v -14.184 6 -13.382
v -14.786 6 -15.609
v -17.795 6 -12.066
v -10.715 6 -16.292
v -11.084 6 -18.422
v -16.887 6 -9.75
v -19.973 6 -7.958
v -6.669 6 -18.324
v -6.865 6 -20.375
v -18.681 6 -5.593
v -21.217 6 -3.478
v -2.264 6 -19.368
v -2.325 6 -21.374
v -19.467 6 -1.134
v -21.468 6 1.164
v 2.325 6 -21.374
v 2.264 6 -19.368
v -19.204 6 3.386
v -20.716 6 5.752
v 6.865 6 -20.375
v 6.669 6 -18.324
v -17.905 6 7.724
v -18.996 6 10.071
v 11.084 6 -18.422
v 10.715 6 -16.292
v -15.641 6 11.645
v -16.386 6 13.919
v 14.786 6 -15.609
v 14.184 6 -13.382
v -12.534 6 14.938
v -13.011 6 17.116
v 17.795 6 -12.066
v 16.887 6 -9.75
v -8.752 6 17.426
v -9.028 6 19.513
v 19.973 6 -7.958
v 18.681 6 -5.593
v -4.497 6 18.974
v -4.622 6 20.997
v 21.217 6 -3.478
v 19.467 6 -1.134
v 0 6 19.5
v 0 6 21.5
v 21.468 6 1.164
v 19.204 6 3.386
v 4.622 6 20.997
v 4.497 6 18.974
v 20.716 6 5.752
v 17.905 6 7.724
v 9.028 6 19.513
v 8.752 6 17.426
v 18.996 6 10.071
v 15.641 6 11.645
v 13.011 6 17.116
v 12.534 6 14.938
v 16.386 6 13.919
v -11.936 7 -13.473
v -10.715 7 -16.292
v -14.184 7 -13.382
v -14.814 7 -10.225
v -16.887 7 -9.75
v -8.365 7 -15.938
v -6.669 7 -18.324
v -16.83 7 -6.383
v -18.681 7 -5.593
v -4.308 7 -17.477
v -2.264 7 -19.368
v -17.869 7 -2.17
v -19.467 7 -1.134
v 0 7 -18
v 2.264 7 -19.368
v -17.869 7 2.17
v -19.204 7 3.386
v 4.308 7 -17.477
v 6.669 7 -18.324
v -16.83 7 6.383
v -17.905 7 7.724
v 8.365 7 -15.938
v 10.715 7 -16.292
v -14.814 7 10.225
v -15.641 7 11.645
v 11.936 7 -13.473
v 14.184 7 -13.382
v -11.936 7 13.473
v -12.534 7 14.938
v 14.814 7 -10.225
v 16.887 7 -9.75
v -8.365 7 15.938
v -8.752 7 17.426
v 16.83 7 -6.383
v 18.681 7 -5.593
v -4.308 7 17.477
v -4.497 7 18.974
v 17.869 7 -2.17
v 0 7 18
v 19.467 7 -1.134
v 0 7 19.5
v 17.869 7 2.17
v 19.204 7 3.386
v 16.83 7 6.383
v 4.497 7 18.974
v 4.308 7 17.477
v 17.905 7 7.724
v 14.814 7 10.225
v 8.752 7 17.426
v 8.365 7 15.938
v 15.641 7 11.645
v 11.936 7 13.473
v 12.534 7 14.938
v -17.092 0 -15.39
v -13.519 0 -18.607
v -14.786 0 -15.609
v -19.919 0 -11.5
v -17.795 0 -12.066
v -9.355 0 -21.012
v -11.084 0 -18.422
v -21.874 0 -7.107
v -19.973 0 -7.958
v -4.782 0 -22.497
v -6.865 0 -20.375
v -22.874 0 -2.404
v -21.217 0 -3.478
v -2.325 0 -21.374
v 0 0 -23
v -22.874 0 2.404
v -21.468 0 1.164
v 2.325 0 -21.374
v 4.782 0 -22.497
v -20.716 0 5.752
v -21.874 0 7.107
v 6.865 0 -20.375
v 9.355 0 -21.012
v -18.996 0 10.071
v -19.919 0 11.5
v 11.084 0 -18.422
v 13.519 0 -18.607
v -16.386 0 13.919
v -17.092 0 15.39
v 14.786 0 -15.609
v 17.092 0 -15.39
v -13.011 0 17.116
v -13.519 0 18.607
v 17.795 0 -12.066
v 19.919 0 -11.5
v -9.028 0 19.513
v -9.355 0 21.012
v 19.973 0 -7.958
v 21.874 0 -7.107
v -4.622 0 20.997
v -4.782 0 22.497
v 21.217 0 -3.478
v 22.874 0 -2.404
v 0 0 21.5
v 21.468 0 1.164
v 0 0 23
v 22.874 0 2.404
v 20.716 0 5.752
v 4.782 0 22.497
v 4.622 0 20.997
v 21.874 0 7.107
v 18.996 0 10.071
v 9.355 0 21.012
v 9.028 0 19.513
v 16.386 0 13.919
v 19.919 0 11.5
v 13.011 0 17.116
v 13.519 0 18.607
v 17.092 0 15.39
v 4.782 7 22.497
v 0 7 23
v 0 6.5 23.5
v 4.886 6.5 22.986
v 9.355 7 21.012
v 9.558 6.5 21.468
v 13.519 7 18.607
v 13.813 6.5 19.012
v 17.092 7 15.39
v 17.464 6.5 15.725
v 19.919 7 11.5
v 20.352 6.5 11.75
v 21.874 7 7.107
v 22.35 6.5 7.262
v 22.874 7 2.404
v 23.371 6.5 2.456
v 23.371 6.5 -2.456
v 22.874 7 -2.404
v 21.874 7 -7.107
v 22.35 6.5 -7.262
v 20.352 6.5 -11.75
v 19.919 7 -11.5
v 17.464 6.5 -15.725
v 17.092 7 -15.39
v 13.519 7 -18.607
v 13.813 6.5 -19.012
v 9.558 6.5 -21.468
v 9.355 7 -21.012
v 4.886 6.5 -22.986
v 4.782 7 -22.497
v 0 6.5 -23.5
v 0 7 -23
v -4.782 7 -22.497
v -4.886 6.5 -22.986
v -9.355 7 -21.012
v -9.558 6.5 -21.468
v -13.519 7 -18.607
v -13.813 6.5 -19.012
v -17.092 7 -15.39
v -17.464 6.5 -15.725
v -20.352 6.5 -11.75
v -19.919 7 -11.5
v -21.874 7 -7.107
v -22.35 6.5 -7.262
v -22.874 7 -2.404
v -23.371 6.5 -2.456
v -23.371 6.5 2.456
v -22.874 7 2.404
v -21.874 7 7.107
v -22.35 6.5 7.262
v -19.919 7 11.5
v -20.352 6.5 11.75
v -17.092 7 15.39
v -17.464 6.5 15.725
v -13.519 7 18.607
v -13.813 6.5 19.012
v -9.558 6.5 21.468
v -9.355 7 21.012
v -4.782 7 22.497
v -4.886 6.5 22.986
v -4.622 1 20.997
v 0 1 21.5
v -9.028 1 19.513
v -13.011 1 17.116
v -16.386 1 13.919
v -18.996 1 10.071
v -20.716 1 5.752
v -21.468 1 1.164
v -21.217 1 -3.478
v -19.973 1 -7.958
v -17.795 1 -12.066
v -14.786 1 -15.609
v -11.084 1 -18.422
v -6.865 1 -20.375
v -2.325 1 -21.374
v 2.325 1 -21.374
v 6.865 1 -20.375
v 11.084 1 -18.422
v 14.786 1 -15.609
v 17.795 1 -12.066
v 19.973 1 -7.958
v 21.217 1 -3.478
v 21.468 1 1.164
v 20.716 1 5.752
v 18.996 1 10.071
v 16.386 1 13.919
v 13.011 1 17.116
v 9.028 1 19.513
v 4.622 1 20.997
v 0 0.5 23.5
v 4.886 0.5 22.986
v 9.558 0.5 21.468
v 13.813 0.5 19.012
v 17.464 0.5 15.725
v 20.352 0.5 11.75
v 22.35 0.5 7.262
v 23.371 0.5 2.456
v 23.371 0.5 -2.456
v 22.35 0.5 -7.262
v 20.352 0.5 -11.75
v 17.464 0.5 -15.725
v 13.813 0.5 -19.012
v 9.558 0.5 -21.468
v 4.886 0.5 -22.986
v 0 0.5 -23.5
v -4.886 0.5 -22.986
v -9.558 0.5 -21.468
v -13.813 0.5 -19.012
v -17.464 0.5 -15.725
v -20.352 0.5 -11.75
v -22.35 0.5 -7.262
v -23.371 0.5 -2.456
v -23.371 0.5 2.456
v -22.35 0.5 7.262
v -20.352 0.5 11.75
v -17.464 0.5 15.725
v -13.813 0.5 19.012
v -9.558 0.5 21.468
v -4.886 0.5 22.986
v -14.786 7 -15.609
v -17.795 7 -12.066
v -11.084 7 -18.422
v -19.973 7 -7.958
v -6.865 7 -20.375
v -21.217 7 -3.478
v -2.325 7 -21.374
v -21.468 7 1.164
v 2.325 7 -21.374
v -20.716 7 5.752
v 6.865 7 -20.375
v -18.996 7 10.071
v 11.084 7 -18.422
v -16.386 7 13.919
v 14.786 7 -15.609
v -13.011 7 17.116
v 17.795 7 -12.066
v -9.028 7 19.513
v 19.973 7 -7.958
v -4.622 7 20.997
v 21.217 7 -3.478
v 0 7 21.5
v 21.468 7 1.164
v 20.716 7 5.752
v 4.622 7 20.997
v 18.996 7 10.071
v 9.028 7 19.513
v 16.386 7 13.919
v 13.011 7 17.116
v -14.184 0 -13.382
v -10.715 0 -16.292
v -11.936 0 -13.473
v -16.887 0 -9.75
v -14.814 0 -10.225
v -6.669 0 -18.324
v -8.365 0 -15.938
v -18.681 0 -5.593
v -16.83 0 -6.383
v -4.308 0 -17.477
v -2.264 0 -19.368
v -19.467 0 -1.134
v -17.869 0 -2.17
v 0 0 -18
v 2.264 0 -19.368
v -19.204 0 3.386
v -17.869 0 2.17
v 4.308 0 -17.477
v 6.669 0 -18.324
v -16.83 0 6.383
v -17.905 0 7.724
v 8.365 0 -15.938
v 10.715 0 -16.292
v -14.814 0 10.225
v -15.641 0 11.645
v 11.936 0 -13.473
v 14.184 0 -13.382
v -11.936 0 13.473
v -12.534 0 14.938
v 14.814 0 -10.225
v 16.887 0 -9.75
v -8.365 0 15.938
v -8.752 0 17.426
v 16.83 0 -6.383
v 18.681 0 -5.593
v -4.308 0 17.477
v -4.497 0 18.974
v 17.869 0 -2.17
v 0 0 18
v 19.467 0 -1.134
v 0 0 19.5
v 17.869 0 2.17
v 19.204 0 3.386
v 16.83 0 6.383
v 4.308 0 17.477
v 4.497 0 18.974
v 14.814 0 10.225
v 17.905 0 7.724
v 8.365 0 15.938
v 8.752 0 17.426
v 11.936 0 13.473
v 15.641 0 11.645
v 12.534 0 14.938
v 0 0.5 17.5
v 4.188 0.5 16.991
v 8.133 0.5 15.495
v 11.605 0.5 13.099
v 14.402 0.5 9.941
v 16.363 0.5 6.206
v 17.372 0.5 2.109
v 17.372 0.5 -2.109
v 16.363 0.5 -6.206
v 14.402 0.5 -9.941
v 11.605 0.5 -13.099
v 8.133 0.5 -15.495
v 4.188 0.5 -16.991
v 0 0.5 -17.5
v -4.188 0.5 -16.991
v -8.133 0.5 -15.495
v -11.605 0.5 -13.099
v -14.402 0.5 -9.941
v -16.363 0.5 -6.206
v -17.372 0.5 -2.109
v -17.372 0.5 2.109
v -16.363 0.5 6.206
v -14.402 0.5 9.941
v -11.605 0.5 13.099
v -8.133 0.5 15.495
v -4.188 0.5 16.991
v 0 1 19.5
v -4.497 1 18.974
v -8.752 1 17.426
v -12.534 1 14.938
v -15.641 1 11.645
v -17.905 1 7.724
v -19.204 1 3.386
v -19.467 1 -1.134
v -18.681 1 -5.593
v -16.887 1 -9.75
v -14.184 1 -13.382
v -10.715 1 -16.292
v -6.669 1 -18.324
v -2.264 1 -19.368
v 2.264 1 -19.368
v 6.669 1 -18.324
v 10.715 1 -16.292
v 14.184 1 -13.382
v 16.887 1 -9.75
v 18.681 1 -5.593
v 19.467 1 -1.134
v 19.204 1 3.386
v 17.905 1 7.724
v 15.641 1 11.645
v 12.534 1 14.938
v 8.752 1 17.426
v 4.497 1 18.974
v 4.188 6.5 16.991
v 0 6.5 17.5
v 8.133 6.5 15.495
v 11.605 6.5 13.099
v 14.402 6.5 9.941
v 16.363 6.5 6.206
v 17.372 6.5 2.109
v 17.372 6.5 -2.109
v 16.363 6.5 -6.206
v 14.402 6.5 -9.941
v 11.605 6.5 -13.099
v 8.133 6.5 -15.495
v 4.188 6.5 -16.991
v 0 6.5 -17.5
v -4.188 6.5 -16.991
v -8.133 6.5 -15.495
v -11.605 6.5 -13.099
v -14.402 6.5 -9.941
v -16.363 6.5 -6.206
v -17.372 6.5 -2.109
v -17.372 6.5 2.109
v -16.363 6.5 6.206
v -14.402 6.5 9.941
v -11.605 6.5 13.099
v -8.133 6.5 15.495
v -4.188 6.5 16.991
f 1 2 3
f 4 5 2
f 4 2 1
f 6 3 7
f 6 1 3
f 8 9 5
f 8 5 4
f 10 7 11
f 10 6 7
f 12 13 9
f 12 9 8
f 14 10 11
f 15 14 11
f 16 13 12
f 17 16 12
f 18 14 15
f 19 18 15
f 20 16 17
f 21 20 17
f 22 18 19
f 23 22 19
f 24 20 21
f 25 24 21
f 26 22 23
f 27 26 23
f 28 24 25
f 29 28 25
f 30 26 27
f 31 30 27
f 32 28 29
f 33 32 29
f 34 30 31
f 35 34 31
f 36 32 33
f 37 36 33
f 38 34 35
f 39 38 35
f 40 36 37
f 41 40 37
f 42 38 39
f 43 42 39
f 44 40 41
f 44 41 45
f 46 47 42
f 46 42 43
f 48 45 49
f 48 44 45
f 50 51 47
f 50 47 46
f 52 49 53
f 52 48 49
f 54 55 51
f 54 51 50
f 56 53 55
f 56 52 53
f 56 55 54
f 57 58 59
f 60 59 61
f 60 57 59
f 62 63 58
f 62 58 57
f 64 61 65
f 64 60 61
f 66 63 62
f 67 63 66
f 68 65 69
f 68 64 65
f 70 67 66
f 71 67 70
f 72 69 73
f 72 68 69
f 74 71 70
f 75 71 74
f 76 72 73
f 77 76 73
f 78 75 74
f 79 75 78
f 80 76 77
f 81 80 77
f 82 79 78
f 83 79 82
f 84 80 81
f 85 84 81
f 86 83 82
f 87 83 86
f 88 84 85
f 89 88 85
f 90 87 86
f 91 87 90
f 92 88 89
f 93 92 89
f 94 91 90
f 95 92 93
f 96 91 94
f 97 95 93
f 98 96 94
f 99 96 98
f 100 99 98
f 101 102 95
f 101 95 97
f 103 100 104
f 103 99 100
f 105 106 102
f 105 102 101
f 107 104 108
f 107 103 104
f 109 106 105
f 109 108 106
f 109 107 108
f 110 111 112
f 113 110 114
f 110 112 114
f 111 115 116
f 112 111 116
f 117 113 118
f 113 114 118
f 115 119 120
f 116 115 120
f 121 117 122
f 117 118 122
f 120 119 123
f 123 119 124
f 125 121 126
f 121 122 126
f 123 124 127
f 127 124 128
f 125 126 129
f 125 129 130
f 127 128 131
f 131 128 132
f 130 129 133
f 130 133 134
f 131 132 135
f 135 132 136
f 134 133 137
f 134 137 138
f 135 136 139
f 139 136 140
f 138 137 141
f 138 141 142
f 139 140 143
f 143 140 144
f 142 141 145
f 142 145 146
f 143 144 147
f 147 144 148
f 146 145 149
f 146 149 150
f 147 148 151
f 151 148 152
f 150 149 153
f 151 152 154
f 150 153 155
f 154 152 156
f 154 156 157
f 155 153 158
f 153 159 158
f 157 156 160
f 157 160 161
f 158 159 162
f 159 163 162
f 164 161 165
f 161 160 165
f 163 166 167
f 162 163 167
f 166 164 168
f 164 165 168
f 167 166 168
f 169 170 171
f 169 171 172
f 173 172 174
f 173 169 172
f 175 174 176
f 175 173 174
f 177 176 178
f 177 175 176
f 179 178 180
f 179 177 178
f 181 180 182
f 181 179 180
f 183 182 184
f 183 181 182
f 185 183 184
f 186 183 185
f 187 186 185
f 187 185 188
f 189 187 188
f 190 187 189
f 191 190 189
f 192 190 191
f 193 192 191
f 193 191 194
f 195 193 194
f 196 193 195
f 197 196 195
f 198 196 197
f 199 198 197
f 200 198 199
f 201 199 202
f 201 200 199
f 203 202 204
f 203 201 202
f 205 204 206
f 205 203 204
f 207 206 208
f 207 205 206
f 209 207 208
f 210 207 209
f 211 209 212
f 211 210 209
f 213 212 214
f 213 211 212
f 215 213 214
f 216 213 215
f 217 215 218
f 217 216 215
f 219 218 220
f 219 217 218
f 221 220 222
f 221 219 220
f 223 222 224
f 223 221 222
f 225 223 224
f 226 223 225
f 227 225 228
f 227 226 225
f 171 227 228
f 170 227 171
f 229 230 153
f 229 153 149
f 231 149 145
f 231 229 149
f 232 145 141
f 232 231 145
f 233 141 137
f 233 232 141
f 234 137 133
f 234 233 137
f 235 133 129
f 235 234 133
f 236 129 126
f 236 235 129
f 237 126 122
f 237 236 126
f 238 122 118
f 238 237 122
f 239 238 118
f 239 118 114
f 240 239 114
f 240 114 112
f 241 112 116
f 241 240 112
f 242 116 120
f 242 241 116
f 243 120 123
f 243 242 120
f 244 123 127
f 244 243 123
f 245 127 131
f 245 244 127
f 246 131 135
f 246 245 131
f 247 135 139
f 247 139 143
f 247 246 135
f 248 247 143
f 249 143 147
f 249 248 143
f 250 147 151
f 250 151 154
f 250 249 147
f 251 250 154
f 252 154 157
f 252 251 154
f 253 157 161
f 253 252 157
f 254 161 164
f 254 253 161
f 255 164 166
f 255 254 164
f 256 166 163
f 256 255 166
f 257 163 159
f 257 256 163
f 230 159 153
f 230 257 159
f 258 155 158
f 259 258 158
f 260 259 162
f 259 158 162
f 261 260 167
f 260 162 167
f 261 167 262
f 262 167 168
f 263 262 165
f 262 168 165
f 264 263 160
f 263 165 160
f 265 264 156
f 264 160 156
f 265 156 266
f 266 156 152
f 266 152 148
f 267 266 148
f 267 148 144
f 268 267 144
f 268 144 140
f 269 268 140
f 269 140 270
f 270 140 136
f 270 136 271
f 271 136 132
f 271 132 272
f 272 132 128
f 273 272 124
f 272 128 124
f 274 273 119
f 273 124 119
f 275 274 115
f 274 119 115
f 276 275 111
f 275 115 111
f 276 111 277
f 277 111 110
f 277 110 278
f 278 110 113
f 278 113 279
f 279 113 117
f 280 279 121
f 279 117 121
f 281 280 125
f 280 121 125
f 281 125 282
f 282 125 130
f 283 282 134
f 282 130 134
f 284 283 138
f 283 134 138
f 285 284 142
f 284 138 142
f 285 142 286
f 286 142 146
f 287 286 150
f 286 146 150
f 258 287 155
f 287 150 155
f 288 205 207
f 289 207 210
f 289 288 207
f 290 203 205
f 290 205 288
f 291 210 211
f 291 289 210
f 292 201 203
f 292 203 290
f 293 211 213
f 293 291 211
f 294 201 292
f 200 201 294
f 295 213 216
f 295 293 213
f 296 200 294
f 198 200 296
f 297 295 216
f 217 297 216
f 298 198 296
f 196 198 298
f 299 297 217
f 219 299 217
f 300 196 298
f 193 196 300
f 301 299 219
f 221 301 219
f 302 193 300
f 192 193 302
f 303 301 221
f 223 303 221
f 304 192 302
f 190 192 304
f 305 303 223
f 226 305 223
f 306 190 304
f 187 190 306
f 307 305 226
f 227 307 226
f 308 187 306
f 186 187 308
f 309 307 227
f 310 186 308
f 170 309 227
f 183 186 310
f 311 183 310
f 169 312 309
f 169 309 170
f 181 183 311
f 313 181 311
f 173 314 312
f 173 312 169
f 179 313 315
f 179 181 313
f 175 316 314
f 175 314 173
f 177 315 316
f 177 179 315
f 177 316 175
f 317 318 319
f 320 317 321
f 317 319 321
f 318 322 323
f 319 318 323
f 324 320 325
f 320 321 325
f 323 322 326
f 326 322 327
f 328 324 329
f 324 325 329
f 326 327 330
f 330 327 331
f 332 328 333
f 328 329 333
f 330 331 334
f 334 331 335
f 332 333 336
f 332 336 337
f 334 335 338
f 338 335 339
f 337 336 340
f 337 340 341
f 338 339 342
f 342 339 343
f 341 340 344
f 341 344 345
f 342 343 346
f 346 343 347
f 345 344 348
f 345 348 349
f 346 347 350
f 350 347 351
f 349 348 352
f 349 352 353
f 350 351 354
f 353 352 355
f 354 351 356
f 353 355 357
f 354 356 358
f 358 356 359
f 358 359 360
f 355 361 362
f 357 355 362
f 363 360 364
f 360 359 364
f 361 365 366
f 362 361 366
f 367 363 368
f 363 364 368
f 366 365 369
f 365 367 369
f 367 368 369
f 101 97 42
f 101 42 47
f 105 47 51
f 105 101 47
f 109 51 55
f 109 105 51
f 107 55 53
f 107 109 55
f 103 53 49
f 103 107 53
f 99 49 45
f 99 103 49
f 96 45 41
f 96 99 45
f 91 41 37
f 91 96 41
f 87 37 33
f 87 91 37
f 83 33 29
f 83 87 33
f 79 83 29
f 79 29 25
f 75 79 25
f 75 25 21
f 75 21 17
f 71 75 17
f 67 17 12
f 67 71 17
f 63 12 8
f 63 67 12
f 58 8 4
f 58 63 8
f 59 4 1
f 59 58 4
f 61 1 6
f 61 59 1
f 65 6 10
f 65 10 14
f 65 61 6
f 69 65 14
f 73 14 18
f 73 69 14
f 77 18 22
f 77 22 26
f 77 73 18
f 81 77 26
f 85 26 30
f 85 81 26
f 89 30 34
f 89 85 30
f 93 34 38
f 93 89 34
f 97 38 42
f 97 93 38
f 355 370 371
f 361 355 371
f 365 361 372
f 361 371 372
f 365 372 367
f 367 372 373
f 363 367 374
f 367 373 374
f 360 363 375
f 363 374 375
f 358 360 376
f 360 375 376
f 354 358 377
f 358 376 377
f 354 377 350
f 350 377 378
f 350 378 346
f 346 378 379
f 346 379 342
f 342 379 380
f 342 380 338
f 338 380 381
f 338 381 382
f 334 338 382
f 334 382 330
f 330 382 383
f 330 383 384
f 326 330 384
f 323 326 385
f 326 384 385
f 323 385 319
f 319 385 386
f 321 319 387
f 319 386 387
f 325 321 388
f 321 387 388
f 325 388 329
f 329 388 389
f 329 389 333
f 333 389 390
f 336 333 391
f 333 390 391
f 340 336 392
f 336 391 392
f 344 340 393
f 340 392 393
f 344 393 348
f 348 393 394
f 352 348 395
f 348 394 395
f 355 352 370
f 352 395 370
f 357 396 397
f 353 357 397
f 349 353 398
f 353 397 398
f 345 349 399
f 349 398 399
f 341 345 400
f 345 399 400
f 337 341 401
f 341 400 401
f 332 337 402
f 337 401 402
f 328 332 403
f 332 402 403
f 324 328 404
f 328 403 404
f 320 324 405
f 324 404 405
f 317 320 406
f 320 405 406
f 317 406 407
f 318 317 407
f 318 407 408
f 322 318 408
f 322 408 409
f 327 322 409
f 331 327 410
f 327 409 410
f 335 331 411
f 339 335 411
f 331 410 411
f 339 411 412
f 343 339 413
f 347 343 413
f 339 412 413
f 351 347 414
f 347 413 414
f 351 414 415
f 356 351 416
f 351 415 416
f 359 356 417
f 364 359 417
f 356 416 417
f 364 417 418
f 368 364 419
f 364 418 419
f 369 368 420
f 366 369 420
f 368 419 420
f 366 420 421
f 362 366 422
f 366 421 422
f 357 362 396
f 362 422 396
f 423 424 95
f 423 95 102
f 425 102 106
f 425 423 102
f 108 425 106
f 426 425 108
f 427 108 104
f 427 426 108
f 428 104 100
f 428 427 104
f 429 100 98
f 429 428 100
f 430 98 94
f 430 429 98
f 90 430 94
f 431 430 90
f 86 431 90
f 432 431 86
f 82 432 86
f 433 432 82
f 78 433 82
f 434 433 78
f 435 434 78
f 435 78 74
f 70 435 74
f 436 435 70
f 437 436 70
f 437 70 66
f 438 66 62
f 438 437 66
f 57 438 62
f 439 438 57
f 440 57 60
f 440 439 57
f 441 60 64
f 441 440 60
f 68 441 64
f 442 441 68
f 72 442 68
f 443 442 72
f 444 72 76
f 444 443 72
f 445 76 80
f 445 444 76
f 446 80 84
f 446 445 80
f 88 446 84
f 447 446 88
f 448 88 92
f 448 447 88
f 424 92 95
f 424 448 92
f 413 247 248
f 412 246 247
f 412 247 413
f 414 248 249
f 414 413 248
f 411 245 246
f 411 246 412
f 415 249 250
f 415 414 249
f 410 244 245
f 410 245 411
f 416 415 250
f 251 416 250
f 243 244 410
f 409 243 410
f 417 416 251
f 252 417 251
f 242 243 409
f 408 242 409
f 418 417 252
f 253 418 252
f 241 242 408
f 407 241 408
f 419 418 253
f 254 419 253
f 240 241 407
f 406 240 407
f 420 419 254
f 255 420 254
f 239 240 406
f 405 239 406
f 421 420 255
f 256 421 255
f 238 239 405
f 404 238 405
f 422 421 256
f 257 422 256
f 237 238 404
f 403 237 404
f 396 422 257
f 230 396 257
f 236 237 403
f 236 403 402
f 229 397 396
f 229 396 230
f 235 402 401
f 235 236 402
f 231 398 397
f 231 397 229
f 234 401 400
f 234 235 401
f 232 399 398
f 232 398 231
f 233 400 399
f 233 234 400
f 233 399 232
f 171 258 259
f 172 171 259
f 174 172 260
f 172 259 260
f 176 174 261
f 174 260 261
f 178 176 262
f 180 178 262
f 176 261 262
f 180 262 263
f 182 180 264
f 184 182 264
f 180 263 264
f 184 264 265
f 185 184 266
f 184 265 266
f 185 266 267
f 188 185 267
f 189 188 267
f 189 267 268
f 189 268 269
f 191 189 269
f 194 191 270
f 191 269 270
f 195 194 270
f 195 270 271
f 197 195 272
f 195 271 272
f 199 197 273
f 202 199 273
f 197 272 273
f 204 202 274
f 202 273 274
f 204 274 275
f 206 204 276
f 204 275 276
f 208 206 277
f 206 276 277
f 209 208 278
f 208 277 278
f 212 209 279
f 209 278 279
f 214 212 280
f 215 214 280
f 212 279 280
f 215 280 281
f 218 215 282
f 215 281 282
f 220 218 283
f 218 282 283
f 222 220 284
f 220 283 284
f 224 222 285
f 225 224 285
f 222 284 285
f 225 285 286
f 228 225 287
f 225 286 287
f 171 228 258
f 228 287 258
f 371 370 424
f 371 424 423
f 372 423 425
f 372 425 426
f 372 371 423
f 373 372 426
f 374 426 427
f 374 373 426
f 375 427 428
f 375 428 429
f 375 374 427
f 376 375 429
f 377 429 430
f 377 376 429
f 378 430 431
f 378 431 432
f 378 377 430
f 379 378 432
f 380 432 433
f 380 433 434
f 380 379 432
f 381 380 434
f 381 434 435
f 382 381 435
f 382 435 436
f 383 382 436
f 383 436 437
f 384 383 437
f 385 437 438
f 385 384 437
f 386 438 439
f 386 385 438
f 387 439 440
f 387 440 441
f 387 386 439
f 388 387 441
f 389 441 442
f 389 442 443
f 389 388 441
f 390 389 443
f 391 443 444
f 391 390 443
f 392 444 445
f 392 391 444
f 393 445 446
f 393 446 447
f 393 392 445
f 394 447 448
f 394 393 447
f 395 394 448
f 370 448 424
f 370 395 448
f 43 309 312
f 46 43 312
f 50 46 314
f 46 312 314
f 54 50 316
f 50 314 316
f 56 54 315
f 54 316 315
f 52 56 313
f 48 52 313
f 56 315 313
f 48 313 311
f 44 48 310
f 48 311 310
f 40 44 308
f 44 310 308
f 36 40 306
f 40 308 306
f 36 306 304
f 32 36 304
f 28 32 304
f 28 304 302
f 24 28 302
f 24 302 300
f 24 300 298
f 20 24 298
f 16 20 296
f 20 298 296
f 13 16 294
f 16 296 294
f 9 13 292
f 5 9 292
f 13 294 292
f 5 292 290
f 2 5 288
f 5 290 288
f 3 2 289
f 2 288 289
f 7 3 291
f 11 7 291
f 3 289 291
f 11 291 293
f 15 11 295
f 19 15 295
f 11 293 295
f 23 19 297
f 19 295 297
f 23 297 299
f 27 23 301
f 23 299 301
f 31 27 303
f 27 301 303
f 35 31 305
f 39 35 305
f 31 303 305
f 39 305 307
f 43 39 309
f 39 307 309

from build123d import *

# Parameters (mm, degrees)
SKETCH1_R           = 23.5
SKETCH1_R_2         = 17.5
BOSS_EXTRUDE1_DEPTH = 7
SKETCH2_R           = 21.5
SKETCH2_R_2         = 19.5
CUT_EXTRUDE1_DEPTH  = 1
CUT_EXTRUDE2_START  = -1
SKETCH3_R           = 21.5
SKETCH3_R_2         = 19.5
CUT_EXTRUDE2_DEPTH  = 1
CHAMFER1_SIZE       = 0.5


with BuildPart() as part:
    # Sketch1 → Boss-Extrude1 (new body)
    with BuildSketch(Plane(origin=(0, 0, 0), x_dir=(1, 0, 0), z_dir=(0, 1, 0))):
        with Locations(Location((0, 0, 0), (0, 0, 270))):
            Circle(SKETCH1_R)
        with Locations(Location((0, 0, 0), (0, 0, 270))):
            Circle(SKETCH1_R_2, mode=Mode.SUBTRACT)
    extrude(amount=BOSS_EXTRUDE1_DEPTH)

    # Sketch2 → Cut-Extrude1 (cut)
    with BuildSketch(Plane(origin=(0, 7, 0), x_dir=(1, 0, 0), z_dir=(0, 1, 0))):
        with Locations(Location((0, 0, 0), (0, 0, 270))):
            Circle(SKETCH2_R)
        with Locations(Location((0, 0, 0), (0, 0, 270))):
            Circle(SKETCH2_R_2, mode=Mode.SUBTRACT)
    extrude(amount=-CUT_EXTRUDE1_DEPTH, mode=Mode.SUBTRACT)

    # Sketch3 → Cut-Extrude2 (cut)
    with BuildSketch(Plane.XZ.offset(CUT_EXTRUDE2_START)):
        with Locations(Location((0, 0, 0), (0, 0, 90))):
            Circle(SKETCH3_R)
        with Locations(Location((0, 0, 0), (0, 0, 90))):
            Circle(SKETCH3_R_2, mode=Mode.SUBTRACT)
    extrude(amount=CUT_EXTRUDE2_DEPTH, mode=Mode.SUBTRACT)

    # Chamfer1
    chamfer1_edges = [part.edges().sort_by_distance(p)[0] for p in [
        (0, 0, -23.5),
        (0, 7, -23.5),
        (0, 0, -17.5),
        (0, 7, -17.5),
    ]]
    chamfer(chamfer1_edges, length=CHAMFER1_SIZE)


solid = part.part
